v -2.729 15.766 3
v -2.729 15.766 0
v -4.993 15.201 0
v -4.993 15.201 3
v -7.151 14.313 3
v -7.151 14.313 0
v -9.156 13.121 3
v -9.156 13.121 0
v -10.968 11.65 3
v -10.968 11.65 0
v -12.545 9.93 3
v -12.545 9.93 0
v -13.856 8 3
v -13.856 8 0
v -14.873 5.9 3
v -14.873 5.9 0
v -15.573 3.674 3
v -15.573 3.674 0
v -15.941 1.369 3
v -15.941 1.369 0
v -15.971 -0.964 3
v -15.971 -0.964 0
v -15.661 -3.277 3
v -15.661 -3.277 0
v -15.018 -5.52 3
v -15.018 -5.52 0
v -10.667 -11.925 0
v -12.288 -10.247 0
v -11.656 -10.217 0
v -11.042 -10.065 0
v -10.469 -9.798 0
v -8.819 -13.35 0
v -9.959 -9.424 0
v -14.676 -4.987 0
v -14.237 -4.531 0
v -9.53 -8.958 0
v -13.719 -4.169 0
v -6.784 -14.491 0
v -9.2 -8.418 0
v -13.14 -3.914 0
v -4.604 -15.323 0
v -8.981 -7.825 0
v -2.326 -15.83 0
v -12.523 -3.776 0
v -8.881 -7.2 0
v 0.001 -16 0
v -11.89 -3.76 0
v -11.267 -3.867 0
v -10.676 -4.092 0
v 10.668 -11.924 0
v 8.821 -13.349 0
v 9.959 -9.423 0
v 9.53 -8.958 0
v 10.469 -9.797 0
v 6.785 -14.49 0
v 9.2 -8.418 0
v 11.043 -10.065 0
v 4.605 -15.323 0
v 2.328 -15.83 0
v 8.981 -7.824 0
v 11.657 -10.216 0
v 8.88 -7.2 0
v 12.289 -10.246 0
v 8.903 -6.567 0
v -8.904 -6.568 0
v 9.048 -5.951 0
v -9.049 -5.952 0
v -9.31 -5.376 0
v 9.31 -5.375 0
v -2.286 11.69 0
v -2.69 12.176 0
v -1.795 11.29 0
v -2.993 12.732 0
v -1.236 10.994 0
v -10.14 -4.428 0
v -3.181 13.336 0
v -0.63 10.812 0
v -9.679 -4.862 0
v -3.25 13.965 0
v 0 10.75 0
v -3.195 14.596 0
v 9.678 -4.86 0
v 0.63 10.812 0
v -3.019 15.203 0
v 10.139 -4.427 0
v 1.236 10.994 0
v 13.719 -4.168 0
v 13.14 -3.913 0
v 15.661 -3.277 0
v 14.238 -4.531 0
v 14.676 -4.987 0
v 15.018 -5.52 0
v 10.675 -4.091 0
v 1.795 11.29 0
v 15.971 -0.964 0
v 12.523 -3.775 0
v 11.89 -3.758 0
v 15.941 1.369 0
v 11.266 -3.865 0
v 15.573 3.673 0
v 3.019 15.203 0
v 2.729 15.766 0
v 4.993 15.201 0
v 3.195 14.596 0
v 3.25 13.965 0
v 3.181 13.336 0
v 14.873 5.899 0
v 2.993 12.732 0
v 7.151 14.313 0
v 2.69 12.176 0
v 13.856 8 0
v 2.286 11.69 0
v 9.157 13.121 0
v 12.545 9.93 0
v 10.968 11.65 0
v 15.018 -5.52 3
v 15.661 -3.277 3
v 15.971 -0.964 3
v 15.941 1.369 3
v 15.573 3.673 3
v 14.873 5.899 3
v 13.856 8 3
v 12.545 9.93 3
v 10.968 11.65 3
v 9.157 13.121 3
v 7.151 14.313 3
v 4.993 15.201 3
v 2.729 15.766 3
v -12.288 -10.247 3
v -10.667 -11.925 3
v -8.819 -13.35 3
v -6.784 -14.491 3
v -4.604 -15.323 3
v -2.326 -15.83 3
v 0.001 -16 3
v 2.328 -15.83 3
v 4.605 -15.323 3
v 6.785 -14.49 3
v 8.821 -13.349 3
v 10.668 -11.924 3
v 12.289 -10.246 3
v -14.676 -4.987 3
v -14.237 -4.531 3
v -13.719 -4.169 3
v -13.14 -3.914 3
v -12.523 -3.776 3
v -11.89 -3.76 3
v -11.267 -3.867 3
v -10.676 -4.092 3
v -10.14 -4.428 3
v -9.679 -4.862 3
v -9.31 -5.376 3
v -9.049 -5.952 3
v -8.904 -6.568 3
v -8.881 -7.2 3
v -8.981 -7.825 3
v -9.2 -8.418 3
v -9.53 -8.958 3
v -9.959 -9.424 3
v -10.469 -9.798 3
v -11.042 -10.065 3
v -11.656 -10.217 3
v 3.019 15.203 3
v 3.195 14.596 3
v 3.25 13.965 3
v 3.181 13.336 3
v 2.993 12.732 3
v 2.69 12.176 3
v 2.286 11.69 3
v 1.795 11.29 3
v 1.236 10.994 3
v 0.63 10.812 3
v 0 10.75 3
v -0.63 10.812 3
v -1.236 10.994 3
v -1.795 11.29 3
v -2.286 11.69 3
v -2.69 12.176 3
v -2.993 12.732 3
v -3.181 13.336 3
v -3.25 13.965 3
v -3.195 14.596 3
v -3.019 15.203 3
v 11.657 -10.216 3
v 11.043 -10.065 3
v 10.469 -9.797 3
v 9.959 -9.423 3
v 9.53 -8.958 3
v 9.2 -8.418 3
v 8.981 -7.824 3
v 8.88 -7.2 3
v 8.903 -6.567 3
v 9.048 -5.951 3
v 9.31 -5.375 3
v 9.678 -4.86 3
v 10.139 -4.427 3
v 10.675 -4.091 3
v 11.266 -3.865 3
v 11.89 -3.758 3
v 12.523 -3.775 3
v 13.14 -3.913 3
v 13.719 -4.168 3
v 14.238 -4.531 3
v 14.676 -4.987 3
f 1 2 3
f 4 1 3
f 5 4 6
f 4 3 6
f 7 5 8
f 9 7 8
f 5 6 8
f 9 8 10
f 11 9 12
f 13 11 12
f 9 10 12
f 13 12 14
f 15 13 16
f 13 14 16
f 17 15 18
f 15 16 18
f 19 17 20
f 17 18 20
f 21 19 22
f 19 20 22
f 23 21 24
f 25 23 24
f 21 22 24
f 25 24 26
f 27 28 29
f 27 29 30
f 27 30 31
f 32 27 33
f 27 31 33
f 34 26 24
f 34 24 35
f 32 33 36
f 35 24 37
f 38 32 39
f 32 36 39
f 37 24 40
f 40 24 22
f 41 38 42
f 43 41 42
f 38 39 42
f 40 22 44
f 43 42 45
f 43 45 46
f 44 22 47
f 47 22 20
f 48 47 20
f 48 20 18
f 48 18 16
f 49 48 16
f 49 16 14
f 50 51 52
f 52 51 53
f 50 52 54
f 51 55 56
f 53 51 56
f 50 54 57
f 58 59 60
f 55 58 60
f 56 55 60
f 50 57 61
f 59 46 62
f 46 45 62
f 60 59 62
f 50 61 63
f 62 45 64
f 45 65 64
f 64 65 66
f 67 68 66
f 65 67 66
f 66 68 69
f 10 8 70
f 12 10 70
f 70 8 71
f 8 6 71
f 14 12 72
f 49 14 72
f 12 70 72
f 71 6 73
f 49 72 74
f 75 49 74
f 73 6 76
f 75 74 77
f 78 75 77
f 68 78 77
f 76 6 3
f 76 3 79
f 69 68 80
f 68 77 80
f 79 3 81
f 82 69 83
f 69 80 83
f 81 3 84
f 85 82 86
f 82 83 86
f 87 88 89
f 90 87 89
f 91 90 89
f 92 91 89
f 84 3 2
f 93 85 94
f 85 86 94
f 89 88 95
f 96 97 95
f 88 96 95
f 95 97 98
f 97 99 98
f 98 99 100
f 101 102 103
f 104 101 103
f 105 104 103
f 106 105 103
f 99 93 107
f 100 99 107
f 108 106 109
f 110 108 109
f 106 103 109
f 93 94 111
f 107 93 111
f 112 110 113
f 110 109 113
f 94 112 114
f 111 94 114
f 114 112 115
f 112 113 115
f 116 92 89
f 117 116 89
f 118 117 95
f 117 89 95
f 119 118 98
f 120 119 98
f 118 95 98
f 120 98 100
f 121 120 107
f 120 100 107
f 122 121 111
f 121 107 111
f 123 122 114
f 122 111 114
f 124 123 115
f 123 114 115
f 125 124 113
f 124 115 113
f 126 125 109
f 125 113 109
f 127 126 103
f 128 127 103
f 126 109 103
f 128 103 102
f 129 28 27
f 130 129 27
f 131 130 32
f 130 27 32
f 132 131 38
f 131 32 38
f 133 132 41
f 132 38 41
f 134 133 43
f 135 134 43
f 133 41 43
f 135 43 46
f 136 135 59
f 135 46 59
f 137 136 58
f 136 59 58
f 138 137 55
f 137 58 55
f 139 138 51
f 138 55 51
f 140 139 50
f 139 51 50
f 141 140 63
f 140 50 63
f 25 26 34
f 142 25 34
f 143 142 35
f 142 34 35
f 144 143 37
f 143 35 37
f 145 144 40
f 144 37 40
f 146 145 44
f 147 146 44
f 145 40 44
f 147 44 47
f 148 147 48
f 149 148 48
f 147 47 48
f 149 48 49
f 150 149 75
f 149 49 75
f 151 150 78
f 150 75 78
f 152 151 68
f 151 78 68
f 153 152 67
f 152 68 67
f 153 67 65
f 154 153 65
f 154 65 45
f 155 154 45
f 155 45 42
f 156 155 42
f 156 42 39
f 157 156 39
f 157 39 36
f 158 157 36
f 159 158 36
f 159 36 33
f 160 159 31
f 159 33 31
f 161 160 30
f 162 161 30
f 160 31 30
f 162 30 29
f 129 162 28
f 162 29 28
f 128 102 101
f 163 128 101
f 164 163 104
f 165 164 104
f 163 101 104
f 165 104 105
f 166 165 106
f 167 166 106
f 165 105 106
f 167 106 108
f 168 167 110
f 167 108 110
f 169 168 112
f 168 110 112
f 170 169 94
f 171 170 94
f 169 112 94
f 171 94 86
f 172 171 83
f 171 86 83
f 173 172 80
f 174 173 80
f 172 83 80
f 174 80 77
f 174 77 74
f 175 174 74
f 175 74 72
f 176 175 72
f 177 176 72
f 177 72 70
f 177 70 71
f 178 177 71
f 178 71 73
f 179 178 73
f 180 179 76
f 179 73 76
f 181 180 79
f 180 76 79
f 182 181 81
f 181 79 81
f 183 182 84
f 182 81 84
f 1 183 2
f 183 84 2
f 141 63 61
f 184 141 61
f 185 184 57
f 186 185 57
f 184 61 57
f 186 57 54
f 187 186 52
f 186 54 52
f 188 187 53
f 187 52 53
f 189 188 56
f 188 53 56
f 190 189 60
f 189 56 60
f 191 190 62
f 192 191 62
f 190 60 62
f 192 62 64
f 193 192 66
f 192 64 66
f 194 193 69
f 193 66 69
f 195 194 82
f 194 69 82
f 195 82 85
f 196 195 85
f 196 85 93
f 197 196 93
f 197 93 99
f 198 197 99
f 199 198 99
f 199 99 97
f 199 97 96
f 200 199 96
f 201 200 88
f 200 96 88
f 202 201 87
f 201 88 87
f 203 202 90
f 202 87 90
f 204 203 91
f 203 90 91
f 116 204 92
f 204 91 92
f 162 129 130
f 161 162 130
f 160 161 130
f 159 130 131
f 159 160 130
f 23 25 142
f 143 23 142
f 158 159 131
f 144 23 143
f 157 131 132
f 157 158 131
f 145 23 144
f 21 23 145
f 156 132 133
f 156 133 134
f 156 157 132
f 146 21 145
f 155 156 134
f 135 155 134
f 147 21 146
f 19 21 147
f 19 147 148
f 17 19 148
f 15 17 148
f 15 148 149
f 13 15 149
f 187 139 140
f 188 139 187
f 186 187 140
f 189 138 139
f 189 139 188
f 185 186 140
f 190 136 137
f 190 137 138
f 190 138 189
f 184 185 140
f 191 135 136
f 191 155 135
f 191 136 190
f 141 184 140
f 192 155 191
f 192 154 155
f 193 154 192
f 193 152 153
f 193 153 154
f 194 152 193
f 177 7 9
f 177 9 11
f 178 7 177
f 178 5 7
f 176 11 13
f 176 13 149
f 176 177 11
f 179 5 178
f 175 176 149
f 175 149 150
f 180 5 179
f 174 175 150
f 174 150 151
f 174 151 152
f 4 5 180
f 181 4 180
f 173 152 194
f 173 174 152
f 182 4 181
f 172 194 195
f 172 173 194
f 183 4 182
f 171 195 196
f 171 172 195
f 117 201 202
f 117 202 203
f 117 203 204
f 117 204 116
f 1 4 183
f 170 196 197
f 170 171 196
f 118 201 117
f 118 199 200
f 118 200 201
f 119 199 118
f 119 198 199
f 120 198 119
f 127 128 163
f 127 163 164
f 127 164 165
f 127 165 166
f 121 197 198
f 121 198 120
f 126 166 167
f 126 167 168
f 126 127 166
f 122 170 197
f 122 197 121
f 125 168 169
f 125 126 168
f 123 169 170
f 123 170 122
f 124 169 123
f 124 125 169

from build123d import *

# Parameters (mm, degrees)
BOSS_EXTRU_2_DEPTH = 3


with BuildPart() as part:
    # Esquisse1 → Boss.-Extru.2 (new body)
    with BuildSketch(Plane.XY):
        with BuildLine():
            ThreePointArc((-12.288149304, -10.247018429), (0.000780623, -15.999999981), (12.289149128, -10.245819328))
            ThreePointArc((12.289149128, -10.245819328), (9.309773091, -5.375), (15.017714385, -5.519805672))
            ThreePointArc((15.017714385, -5.519805672), (13.856406461, 8), (2.728565257, 15.765625))
            ThreePointArc((2.728565257, 15.765625), (0, 10.75), (-2.728565257, 15.765625))
            ThreePointArc((-2.728565257, 15.765625), (-13.856384318, 8.000038352), (-15.01774494, -5.519722539))
            ThreePointArc((-15.01774494, -5.519722539), (-9.310492225, -5.375986513), (-12.288149304, -10.247018429))
        make_face()
    extrude(amount=BOSS_EXTRU_2_DEPTH)


solid = part.part
